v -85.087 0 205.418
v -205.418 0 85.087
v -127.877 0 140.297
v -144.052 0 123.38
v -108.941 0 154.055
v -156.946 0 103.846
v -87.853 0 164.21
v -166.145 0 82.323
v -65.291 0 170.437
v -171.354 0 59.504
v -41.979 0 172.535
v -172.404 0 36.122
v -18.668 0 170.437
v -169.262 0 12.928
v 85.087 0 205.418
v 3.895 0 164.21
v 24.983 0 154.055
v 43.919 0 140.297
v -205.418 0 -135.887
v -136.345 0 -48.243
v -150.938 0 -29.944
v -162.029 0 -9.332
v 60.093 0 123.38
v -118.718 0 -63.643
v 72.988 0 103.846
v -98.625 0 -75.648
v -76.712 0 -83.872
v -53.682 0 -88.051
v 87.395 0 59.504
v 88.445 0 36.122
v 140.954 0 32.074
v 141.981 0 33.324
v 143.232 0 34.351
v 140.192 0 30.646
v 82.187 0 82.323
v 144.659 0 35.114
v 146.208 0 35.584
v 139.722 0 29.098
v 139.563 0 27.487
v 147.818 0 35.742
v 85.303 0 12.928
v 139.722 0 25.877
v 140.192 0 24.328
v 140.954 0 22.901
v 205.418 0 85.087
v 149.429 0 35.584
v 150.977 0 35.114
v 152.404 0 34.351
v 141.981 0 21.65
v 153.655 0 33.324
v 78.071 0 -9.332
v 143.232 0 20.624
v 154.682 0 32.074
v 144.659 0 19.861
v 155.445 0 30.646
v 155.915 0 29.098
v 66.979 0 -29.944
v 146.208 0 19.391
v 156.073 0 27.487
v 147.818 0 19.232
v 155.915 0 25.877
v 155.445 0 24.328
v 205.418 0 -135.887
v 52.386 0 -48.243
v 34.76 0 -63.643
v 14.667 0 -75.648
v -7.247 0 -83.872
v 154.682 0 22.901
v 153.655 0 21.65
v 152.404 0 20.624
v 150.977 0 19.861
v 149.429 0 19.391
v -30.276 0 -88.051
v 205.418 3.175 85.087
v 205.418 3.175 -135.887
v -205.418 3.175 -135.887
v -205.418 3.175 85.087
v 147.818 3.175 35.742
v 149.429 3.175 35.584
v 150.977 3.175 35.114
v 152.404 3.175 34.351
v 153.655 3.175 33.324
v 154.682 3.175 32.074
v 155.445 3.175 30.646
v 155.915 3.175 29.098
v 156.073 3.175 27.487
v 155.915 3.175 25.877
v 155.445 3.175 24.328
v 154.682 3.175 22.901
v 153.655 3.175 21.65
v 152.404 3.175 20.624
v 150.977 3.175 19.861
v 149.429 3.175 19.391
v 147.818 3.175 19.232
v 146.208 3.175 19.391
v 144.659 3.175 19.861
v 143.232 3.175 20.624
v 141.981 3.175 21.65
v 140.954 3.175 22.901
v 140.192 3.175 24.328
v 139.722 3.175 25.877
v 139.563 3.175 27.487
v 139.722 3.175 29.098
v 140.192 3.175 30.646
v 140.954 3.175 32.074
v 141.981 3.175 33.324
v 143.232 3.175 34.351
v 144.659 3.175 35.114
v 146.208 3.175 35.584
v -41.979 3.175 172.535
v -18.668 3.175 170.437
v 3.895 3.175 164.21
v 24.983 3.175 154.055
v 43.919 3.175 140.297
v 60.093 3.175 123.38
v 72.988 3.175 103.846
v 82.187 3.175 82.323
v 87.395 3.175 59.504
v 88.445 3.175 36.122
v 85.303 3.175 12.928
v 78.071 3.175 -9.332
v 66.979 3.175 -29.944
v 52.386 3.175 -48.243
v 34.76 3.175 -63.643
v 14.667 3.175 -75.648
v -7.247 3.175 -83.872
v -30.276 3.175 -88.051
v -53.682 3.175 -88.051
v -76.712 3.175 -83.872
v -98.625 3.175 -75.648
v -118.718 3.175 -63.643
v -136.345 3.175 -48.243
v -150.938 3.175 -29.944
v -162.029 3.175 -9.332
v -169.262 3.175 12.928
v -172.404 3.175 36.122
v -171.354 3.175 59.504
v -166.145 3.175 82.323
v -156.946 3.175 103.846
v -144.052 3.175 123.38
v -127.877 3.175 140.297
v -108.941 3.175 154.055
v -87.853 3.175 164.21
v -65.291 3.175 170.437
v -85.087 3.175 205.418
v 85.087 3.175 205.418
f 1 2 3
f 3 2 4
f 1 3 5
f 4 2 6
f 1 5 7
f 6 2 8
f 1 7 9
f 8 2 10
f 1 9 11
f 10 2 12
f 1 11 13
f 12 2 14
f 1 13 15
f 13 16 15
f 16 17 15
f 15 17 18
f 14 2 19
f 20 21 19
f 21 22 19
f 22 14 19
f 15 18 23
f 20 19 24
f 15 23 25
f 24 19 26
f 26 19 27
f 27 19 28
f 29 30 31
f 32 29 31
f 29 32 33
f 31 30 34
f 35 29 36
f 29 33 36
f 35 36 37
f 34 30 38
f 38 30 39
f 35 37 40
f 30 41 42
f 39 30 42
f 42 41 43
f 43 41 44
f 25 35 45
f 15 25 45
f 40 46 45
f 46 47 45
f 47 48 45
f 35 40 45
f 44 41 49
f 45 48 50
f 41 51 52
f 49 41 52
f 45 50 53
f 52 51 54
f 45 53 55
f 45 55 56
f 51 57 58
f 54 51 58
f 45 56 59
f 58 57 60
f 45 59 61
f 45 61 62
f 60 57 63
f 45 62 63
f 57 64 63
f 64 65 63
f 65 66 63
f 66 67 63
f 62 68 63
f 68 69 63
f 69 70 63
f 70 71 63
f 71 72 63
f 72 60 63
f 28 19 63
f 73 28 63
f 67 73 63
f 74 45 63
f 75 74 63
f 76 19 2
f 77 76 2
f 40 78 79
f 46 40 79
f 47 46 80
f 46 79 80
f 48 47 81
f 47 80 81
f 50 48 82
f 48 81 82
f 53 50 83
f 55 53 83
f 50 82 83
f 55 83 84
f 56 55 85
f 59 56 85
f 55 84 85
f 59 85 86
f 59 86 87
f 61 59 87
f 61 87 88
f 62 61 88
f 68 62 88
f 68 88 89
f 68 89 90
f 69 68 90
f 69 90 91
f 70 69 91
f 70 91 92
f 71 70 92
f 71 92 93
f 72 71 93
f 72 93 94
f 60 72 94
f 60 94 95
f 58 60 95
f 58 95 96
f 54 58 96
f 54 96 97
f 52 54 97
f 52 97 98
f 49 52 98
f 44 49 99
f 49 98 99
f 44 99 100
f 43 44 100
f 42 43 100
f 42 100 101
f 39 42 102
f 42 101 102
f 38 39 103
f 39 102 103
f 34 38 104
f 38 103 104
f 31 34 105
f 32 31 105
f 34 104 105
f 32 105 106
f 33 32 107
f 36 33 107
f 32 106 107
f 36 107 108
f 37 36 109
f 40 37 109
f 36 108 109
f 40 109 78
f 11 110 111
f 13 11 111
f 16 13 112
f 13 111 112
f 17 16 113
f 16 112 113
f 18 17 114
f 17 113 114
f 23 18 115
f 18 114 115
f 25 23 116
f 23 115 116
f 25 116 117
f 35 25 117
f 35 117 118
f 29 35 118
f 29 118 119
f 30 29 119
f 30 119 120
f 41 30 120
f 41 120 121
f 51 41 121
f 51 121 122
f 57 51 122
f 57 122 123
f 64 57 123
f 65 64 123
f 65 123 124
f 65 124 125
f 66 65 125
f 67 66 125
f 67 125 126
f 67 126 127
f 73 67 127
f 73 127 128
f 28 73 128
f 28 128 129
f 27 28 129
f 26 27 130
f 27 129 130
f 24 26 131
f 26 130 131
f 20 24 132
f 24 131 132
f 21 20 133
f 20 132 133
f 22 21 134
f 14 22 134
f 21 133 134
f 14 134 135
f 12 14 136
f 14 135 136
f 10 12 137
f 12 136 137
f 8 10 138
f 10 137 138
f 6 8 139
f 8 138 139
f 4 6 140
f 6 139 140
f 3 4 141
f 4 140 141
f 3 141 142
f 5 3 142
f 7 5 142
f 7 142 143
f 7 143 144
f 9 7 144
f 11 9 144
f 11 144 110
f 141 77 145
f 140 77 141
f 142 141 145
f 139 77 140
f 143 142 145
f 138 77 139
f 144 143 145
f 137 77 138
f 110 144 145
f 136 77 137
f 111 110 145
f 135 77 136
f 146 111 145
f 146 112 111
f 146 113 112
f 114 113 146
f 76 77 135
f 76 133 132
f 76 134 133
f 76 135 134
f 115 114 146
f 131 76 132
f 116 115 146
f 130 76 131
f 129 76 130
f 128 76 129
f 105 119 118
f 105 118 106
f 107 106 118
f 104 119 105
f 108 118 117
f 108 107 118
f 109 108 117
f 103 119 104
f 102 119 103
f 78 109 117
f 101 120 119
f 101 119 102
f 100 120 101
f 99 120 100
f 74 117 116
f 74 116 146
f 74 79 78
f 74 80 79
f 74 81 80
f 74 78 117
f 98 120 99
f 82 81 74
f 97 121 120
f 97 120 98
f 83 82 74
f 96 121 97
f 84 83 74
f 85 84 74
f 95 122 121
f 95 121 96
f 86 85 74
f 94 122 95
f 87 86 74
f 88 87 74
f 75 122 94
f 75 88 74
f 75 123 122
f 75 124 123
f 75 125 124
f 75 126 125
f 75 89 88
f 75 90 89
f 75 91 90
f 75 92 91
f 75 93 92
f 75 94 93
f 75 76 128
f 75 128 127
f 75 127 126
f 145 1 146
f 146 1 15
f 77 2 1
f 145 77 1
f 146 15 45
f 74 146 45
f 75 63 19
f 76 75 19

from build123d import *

# Parameters (mm, degrees)
BOSS_EXTRUDE1_DEPTH = 3.175
SKETCH3_R           = 130.556
CUT_EXTRUDE2_DEPTH  = 4.175
SKETCH4_R           = 8.255
CUT_EXTRUDE3_DEPTH  = 4.175


with BuildPart() as part:
    # Sketch1 → Boss-Extrude1 (new body)
    with BuildSketch(Plane(origin=(0, 0, 0), x_dir=(1, 0, 0), z_dir=(0, 1, 0))):
        Polygon((-205.417689271, 85.086792847), (-205.417689271, -85.086792847), (-85.086792847, -205.417689271), (85.086792847, -205.417689271), (205.417689271, -85.086792847), (205.417689271, 85.086792847), (205.417689271, 135.886792847), (-205.417689271, 135.886792847), align=None)
    extrude(amount=BOSS_EXTRUDE1_DEPTH)

    # Sketch3 → Cut-Extrude2 (cut, through all)
    with BuildSketch(Plane(origin=(0, 3.175, 0), x_dir=(-1, 0, 0), z_dir=(0, 1, 0))):
        with Locations(Location((41.979295667, 41.979295667, 0), (0, 0, 90))):  # turned: the seam where the file's is
            Circle(SKETCH3_R)
    extrude(amount=-CUT_EXTRUDE2_DEPTH, mode=Mode.SUBTRACT)

    # Sketch4 → Cut-Extrude3 (cut, through all)
    with BuildSketch(Plane(origin=(0, 3.175, 0), x_dir=(1, 0, 0), z_dir=(0, 1, 0))):
        with Locations(Location((147.81822682, -27.487330396, 0), (0, 0, 270))):  # turned: the seam where the file's is
            Circle(SKETCH4_R)
    extrude(amount=-CUT_EXTRUDE3_DEPTH, mode=Mode.SUBTRACT)


solid = part.part
